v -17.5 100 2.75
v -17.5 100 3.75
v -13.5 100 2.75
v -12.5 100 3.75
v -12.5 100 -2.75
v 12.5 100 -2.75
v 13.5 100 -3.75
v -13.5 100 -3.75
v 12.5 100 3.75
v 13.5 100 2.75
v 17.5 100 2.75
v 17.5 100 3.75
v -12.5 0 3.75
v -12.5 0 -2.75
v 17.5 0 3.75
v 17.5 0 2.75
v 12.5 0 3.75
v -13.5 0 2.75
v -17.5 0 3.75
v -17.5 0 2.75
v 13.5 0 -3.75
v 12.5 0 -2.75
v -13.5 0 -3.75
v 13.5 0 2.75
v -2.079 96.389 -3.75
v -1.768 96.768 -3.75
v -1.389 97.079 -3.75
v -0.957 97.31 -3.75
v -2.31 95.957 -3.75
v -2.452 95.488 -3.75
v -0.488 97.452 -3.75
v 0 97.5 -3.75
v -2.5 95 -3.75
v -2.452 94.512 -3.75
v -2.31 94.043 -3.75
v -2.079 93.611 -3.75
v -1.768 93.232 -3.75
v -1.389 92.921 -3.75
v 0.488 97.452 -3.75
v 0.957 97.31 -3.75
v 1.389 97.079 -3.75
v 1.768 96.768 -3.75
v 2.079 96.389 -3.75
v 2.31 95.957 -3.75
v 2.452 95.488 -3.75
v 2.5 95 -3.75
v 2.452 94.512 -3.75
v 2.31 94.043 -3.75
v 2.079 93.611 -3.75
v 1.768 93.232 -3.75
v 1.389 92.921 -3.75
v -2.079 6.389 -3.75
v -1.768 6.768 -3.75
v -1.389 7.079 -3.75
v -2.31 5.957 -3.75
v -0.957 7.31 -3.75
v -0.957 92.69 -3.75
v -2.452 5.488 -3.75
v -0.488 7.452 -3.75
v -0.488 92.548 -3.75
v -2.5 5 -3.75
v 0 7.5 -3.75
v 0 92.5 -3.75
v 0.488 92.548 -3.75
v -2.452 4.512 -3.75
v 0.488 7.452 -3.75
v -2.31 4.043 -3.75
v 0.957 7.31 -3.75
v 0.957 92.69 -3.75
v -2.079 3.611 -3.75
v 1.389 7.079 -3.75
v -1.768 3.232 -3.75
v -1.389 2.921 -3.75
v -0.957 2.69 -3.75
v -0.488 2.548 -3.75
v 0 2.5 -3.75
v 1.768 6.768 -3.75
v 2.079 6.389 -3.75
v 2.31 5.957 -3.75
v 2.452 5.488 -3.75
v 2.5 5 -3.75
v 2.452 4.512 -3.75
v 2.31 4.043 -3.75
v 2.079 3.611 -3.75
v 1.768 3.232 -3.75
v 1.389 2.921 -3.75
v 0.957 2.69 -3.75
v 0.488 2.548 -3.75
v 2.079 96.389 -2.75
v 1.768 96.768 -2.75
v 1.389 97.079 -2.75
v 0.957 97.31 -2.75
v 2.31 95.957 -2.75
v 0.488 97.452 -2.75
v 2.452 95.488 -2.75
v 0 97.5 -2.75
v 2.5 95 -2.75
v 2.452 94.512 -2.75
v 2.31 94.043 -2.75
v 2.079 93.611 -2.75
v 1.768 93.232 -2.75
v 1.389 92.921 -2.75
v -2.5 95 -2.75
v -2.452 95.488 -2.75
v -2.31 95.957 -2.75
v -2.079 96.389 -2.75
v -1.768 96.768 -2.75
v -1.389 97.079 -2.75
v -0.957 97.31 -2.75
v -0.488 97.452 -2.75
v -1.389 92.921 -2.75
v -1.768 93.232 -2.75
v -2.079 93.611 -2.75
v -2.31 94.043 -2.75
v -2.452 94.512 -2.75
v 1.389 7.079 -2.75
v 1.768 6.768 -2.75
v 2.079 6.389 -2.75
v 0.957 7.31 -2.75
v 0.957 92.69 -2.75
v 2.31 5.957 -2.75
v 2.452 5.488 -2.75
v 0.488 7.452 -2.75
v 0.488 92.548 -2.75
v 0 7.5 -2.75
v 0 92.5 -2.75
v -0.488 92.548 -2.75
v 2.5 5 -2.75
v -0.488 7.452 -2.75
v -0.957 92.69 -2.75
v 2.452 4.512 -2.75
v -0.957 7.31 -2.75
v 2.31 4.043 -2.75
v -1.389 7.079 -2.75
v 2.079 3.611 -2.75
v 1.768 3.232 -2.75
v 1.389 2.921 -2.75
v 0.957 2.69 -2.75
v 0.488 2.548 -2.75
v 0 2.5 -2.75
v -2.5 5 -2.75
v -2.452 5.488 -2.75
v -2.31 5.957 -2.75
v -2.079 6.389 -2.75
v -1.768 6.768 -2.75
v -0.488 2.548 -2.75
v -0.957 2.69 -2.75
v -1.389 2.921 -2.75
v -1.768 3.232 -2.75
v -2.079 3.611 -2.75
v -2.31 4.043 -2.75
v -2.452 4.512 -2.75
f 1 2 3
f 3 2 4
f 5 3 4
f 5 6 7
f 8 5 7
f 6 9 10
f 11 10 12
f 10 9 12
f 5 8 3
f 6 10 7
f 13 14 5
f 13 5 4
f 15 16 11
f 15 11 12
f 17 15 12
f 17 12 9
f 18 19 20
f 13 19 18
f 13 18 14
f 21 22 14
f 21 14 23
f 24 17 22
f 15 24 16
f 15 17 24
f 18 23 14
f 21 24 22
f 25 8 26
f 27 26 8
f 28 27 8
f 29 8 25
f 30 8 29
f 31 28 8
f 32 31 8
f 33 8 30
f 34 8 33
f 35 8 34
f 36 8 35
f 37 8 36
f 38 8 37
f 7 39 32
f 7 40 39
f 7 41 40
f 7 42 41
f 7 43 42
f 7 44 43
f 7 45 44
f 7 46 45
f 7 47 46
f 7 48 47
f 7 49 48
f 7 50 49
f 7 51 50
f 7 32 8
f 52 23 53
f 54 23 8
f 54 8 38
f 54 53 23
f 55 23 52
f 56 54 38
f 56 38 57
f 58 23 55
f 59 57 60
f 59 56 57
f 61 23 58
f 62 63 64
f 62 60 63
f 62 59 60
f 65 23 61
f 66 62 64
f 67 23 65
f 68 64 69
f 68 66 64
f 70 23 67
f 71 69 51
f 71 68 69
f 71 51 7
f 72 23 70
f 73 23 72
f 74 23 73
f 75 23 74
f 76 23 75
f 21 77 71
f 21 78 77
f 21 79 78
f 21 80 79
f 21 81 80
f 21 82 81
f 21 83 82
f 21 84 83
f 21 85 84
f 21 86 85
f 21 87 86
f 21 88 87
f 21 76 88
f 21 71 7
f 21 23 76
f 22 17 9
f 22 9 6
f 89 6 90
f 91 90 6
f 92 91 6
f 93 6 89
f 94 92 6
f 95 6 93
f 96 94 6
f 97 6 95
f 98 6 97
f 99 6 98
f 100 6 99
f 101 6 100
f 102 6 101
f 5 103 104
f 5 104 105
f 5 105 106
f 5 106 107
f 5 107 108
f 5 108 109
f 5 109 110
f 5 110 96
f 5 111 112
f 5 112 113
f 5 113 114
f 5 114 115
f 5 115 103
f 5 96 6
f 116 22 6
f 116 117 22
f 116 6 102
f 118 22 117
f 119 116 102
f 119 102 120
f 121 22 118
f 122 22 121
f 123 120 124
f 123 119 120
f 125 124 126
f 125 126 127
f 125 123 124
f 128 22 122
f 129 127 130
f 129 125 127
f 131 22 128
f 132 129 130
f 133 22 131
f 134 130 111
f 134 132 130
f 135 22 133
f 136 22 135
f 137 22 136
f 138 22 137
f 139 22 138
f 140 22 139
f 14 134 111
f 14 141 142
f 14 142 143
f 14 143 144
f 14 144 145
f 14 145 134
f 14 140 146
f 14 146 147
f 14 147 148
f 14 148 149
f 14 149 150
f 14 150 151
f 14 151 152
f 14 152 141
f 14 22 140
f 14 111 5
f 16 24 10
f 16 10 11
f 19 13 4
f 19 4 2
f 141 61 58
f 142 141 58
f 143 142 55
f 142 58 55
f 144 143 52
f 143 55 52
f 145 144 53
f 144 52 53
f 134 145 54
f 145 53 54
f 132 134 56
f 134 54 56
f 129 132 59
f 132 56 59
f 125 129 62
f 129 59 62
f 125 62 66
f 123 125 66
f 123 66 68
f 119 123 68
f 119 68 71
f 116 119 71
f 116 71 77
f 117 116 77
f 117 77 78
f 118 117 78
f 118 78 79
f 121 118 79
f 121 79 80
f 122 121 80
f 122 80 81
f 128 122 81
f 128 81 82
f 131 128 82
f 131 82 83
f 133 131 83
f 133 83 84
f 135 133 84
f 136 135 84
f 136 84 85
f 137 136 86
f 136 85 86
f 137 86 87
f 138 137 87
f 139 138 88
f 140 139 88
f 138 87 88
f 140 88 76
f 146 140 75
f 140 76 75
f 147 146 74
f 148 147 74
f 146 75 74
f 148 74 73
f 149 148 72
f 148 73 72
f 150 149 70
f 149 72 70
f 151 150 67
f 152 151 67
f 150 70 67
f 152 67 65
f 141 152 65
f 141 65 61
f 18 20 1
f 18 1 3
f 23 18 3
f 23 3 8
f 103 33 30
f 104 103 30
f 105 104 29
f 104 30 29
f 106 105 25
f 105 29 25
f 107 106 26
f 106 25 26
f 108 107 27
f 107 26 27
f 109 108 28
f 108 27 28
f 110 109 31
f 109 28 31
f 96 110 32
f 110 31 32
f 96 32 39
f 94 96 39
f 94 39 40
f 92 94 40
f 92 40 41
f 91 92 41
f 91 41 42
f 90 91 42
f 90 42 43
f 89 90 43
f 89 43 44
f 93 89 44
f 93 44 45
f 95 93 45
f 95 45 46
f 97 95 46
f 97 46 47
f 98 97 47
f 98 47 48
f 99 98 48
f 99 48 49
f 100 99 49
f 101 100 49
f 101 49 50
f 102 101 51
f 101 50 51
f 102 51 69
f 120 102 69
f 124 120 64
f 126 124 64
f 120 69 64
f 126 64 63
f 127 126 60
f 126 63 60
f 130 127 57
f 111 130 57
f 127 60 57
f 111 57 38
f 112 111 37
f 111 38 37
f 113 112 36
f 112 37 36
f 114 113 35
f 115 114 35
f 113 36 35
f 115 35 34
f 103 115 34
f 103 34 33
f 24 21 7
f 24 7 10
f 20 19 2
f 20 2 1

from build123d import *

# Parameters (mm, degrees)
F1_DEPTH = 100
F3_D     = 5


with BuildPart() as f1:
    # F0 (on Front) → F1 (new body)
    with BuildSketch(Plane.XZ):
        Polygon((-12.5, 3.75), (-17.5, 3.75), (-17.5, 2.75), (-13.5, 2.75), (-13.5, -3.75), (-2.6, -3.75), (2.6, -3.75), (13.5, -3.75), (13.5, 2.75), (17.5, 2.75), (17.5, 3.75), (12.5, 3.75), (12.5, -2.75), (2.6, -2.75), (-2.6, -2.75), (-12.5, -2.75), align=None)
    extrude(amount=-F1_DEPTH)

    # F3 (through all)
    with Locations(Plane.XY.offset(-2.75)):
        with Locations((0, 95), (0, 5)):
            Hole(F3_D / 2)


solid = f1.part
